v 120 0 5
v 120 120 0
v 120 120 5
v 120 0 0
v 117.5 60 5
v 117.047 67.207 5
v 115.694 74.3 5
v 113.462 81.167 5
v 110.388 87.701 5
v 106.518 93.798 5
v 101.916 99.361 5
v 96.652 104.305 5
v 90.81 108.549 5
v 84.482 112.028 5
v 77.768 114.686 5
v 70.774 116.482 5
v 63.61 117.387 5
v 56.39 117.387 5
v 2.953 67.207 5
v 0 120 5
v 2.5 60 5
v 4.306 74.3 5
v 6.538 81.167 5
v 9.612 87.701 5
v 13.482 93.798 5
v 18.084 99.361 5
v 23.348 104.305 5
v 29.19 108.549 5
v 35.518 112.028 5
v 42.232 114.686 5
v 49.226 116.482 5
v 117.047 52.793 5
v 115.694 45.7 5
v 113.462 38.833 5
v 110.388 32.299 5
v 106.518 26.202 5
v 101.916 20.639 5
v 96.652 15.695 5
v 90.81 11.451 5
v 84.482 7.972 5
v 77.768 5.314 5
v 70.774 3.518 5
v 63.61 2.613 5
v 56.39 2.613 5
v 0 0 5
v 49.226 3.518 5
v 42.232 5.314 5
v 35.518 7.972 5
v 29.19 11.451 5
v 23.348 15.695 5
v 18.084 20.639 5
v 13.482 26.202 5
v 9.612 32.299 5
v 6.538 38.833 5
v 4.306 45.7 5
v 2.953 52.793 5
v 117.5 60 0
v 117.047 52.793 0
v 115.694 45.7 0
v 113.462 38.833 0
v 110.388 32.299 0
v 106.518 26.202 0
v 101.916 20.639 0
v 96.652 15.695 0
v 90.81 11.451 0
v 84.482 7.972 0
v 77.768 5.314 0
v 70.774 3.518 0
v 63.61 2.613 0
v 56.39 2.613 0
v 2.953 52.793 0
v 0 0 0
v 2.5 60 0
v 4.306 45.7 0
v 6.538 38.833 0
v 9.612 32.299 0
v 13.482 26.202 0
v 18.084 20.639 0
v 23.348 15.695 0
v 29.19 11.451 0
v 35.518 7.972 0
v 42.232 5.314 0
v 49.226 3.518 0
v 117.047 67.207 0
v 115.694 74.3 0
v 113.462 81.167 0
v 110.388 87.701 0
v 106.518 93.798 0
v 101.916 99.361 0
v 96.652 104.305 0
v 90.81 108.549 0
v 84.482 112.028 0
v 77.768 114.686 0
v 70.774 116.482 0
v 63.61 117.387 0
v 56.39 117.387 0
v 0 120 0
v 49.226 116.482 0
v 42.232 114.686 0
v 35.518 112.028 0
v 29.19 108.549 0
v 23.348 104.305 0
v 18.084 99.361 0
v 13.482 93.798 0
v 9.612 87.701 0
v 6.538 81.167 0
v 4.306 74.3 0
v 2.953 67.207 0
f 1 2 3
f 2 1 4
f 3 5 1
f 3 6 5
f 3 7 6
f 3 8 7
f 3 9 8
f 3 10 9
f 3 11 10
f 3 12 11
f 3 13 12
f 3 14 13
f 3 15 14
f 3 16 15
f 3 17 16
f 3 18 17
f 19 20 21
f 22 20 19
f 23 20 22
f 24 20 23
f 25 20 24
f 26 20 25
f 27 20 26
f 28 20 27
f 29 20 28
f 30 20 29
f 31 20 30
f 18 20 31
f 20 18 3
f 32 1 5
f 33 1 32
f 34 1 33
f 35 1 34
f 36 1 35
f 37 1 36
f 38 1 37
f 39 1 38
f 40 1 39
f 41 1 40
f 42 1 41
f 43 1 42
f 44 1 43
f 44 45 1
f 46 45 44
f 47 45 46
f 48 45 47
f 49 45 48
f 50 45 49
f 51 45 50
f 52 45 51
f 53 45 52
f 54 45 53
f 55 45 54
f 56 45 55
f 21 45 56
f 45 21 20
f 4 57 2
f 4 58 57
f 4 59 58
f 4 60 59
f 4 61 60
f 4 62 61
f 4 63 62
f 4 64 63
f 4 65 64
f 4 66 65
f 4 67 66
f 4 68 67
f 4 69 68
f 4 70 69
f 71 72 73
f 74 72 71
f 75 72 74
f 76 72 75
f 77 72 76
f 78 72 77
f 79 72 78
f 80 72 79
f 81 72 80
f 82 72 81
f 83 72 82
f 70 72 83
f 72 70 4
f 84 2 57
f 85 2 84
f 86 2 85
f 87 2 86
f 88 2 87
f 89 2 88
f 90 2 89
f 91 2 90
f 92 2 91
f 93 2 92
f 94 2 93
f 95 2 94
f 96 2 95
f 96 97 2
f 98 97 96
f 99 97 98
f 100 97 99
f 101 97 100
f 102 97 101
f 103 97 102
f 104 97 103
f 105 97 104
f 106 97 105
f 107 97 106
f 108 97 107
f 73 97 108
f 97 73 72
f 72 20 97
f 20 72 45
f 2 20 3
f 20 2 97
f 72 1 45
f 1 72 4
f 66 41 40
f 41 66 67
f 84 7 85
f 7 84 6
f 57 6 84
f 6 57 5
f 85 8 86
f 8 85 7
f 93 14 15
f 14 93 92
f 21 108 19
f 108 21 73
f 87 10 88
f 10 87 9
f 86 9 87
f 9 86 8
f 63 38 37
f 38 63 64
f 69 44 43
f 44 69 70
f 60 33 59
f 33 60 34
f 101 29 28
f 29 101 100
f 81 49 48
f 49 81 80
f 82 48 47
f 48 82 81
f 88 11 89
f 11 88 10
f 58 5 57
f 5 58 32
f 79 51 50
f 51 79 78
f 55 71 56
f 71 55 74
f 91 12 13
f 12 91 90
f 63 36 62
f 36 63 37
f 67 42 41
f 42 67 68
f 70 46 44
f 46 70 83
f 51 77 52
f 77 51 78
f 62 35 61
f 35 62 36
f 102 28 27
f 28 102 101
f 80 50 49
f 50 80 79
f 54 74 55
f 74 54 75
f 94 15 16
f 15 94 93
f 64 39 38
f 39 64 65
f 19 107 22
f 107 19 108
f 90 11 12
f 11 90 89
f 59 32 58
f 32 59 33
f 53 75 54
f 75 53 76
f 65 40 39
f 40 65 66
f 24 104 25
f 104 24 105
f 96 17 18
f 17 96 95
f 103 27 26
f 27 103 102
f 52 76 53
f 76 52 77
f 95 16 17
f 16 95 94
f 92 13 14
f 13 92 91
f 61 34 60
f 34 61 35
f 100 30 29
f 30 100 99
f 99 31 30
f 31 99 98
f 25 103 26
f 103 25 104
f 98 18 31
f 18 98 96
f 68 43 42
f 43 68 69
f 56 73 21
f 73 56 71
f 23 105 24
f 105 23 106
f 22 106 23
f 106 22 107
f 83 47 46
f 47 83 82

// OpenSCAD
//
// USBカメラ用固定板
//
// USBcameraBaseplate-3-20260212B.scad
//
// Last update: 2026-02-10(Tue) 07:54 JST / 2026-02-09(Mon) 22:54 UTC
//

// パネルサイズと穴位置
Px = 120.0; Py = 120.0; Pz = 5.0;   // 縦・横・厚
Hd = 115.0;                           // 穴径。ちょっと大きめ


// ベースパネルに  穴4つ（角から Hp だけ内側に）
difference() {
  cube([Px, Py, Pz]);
      translate([Px/2, Py/2, -1.0])
        cylinder(h = Pz + 2.0, d = Hd, $fn = 50);
}
